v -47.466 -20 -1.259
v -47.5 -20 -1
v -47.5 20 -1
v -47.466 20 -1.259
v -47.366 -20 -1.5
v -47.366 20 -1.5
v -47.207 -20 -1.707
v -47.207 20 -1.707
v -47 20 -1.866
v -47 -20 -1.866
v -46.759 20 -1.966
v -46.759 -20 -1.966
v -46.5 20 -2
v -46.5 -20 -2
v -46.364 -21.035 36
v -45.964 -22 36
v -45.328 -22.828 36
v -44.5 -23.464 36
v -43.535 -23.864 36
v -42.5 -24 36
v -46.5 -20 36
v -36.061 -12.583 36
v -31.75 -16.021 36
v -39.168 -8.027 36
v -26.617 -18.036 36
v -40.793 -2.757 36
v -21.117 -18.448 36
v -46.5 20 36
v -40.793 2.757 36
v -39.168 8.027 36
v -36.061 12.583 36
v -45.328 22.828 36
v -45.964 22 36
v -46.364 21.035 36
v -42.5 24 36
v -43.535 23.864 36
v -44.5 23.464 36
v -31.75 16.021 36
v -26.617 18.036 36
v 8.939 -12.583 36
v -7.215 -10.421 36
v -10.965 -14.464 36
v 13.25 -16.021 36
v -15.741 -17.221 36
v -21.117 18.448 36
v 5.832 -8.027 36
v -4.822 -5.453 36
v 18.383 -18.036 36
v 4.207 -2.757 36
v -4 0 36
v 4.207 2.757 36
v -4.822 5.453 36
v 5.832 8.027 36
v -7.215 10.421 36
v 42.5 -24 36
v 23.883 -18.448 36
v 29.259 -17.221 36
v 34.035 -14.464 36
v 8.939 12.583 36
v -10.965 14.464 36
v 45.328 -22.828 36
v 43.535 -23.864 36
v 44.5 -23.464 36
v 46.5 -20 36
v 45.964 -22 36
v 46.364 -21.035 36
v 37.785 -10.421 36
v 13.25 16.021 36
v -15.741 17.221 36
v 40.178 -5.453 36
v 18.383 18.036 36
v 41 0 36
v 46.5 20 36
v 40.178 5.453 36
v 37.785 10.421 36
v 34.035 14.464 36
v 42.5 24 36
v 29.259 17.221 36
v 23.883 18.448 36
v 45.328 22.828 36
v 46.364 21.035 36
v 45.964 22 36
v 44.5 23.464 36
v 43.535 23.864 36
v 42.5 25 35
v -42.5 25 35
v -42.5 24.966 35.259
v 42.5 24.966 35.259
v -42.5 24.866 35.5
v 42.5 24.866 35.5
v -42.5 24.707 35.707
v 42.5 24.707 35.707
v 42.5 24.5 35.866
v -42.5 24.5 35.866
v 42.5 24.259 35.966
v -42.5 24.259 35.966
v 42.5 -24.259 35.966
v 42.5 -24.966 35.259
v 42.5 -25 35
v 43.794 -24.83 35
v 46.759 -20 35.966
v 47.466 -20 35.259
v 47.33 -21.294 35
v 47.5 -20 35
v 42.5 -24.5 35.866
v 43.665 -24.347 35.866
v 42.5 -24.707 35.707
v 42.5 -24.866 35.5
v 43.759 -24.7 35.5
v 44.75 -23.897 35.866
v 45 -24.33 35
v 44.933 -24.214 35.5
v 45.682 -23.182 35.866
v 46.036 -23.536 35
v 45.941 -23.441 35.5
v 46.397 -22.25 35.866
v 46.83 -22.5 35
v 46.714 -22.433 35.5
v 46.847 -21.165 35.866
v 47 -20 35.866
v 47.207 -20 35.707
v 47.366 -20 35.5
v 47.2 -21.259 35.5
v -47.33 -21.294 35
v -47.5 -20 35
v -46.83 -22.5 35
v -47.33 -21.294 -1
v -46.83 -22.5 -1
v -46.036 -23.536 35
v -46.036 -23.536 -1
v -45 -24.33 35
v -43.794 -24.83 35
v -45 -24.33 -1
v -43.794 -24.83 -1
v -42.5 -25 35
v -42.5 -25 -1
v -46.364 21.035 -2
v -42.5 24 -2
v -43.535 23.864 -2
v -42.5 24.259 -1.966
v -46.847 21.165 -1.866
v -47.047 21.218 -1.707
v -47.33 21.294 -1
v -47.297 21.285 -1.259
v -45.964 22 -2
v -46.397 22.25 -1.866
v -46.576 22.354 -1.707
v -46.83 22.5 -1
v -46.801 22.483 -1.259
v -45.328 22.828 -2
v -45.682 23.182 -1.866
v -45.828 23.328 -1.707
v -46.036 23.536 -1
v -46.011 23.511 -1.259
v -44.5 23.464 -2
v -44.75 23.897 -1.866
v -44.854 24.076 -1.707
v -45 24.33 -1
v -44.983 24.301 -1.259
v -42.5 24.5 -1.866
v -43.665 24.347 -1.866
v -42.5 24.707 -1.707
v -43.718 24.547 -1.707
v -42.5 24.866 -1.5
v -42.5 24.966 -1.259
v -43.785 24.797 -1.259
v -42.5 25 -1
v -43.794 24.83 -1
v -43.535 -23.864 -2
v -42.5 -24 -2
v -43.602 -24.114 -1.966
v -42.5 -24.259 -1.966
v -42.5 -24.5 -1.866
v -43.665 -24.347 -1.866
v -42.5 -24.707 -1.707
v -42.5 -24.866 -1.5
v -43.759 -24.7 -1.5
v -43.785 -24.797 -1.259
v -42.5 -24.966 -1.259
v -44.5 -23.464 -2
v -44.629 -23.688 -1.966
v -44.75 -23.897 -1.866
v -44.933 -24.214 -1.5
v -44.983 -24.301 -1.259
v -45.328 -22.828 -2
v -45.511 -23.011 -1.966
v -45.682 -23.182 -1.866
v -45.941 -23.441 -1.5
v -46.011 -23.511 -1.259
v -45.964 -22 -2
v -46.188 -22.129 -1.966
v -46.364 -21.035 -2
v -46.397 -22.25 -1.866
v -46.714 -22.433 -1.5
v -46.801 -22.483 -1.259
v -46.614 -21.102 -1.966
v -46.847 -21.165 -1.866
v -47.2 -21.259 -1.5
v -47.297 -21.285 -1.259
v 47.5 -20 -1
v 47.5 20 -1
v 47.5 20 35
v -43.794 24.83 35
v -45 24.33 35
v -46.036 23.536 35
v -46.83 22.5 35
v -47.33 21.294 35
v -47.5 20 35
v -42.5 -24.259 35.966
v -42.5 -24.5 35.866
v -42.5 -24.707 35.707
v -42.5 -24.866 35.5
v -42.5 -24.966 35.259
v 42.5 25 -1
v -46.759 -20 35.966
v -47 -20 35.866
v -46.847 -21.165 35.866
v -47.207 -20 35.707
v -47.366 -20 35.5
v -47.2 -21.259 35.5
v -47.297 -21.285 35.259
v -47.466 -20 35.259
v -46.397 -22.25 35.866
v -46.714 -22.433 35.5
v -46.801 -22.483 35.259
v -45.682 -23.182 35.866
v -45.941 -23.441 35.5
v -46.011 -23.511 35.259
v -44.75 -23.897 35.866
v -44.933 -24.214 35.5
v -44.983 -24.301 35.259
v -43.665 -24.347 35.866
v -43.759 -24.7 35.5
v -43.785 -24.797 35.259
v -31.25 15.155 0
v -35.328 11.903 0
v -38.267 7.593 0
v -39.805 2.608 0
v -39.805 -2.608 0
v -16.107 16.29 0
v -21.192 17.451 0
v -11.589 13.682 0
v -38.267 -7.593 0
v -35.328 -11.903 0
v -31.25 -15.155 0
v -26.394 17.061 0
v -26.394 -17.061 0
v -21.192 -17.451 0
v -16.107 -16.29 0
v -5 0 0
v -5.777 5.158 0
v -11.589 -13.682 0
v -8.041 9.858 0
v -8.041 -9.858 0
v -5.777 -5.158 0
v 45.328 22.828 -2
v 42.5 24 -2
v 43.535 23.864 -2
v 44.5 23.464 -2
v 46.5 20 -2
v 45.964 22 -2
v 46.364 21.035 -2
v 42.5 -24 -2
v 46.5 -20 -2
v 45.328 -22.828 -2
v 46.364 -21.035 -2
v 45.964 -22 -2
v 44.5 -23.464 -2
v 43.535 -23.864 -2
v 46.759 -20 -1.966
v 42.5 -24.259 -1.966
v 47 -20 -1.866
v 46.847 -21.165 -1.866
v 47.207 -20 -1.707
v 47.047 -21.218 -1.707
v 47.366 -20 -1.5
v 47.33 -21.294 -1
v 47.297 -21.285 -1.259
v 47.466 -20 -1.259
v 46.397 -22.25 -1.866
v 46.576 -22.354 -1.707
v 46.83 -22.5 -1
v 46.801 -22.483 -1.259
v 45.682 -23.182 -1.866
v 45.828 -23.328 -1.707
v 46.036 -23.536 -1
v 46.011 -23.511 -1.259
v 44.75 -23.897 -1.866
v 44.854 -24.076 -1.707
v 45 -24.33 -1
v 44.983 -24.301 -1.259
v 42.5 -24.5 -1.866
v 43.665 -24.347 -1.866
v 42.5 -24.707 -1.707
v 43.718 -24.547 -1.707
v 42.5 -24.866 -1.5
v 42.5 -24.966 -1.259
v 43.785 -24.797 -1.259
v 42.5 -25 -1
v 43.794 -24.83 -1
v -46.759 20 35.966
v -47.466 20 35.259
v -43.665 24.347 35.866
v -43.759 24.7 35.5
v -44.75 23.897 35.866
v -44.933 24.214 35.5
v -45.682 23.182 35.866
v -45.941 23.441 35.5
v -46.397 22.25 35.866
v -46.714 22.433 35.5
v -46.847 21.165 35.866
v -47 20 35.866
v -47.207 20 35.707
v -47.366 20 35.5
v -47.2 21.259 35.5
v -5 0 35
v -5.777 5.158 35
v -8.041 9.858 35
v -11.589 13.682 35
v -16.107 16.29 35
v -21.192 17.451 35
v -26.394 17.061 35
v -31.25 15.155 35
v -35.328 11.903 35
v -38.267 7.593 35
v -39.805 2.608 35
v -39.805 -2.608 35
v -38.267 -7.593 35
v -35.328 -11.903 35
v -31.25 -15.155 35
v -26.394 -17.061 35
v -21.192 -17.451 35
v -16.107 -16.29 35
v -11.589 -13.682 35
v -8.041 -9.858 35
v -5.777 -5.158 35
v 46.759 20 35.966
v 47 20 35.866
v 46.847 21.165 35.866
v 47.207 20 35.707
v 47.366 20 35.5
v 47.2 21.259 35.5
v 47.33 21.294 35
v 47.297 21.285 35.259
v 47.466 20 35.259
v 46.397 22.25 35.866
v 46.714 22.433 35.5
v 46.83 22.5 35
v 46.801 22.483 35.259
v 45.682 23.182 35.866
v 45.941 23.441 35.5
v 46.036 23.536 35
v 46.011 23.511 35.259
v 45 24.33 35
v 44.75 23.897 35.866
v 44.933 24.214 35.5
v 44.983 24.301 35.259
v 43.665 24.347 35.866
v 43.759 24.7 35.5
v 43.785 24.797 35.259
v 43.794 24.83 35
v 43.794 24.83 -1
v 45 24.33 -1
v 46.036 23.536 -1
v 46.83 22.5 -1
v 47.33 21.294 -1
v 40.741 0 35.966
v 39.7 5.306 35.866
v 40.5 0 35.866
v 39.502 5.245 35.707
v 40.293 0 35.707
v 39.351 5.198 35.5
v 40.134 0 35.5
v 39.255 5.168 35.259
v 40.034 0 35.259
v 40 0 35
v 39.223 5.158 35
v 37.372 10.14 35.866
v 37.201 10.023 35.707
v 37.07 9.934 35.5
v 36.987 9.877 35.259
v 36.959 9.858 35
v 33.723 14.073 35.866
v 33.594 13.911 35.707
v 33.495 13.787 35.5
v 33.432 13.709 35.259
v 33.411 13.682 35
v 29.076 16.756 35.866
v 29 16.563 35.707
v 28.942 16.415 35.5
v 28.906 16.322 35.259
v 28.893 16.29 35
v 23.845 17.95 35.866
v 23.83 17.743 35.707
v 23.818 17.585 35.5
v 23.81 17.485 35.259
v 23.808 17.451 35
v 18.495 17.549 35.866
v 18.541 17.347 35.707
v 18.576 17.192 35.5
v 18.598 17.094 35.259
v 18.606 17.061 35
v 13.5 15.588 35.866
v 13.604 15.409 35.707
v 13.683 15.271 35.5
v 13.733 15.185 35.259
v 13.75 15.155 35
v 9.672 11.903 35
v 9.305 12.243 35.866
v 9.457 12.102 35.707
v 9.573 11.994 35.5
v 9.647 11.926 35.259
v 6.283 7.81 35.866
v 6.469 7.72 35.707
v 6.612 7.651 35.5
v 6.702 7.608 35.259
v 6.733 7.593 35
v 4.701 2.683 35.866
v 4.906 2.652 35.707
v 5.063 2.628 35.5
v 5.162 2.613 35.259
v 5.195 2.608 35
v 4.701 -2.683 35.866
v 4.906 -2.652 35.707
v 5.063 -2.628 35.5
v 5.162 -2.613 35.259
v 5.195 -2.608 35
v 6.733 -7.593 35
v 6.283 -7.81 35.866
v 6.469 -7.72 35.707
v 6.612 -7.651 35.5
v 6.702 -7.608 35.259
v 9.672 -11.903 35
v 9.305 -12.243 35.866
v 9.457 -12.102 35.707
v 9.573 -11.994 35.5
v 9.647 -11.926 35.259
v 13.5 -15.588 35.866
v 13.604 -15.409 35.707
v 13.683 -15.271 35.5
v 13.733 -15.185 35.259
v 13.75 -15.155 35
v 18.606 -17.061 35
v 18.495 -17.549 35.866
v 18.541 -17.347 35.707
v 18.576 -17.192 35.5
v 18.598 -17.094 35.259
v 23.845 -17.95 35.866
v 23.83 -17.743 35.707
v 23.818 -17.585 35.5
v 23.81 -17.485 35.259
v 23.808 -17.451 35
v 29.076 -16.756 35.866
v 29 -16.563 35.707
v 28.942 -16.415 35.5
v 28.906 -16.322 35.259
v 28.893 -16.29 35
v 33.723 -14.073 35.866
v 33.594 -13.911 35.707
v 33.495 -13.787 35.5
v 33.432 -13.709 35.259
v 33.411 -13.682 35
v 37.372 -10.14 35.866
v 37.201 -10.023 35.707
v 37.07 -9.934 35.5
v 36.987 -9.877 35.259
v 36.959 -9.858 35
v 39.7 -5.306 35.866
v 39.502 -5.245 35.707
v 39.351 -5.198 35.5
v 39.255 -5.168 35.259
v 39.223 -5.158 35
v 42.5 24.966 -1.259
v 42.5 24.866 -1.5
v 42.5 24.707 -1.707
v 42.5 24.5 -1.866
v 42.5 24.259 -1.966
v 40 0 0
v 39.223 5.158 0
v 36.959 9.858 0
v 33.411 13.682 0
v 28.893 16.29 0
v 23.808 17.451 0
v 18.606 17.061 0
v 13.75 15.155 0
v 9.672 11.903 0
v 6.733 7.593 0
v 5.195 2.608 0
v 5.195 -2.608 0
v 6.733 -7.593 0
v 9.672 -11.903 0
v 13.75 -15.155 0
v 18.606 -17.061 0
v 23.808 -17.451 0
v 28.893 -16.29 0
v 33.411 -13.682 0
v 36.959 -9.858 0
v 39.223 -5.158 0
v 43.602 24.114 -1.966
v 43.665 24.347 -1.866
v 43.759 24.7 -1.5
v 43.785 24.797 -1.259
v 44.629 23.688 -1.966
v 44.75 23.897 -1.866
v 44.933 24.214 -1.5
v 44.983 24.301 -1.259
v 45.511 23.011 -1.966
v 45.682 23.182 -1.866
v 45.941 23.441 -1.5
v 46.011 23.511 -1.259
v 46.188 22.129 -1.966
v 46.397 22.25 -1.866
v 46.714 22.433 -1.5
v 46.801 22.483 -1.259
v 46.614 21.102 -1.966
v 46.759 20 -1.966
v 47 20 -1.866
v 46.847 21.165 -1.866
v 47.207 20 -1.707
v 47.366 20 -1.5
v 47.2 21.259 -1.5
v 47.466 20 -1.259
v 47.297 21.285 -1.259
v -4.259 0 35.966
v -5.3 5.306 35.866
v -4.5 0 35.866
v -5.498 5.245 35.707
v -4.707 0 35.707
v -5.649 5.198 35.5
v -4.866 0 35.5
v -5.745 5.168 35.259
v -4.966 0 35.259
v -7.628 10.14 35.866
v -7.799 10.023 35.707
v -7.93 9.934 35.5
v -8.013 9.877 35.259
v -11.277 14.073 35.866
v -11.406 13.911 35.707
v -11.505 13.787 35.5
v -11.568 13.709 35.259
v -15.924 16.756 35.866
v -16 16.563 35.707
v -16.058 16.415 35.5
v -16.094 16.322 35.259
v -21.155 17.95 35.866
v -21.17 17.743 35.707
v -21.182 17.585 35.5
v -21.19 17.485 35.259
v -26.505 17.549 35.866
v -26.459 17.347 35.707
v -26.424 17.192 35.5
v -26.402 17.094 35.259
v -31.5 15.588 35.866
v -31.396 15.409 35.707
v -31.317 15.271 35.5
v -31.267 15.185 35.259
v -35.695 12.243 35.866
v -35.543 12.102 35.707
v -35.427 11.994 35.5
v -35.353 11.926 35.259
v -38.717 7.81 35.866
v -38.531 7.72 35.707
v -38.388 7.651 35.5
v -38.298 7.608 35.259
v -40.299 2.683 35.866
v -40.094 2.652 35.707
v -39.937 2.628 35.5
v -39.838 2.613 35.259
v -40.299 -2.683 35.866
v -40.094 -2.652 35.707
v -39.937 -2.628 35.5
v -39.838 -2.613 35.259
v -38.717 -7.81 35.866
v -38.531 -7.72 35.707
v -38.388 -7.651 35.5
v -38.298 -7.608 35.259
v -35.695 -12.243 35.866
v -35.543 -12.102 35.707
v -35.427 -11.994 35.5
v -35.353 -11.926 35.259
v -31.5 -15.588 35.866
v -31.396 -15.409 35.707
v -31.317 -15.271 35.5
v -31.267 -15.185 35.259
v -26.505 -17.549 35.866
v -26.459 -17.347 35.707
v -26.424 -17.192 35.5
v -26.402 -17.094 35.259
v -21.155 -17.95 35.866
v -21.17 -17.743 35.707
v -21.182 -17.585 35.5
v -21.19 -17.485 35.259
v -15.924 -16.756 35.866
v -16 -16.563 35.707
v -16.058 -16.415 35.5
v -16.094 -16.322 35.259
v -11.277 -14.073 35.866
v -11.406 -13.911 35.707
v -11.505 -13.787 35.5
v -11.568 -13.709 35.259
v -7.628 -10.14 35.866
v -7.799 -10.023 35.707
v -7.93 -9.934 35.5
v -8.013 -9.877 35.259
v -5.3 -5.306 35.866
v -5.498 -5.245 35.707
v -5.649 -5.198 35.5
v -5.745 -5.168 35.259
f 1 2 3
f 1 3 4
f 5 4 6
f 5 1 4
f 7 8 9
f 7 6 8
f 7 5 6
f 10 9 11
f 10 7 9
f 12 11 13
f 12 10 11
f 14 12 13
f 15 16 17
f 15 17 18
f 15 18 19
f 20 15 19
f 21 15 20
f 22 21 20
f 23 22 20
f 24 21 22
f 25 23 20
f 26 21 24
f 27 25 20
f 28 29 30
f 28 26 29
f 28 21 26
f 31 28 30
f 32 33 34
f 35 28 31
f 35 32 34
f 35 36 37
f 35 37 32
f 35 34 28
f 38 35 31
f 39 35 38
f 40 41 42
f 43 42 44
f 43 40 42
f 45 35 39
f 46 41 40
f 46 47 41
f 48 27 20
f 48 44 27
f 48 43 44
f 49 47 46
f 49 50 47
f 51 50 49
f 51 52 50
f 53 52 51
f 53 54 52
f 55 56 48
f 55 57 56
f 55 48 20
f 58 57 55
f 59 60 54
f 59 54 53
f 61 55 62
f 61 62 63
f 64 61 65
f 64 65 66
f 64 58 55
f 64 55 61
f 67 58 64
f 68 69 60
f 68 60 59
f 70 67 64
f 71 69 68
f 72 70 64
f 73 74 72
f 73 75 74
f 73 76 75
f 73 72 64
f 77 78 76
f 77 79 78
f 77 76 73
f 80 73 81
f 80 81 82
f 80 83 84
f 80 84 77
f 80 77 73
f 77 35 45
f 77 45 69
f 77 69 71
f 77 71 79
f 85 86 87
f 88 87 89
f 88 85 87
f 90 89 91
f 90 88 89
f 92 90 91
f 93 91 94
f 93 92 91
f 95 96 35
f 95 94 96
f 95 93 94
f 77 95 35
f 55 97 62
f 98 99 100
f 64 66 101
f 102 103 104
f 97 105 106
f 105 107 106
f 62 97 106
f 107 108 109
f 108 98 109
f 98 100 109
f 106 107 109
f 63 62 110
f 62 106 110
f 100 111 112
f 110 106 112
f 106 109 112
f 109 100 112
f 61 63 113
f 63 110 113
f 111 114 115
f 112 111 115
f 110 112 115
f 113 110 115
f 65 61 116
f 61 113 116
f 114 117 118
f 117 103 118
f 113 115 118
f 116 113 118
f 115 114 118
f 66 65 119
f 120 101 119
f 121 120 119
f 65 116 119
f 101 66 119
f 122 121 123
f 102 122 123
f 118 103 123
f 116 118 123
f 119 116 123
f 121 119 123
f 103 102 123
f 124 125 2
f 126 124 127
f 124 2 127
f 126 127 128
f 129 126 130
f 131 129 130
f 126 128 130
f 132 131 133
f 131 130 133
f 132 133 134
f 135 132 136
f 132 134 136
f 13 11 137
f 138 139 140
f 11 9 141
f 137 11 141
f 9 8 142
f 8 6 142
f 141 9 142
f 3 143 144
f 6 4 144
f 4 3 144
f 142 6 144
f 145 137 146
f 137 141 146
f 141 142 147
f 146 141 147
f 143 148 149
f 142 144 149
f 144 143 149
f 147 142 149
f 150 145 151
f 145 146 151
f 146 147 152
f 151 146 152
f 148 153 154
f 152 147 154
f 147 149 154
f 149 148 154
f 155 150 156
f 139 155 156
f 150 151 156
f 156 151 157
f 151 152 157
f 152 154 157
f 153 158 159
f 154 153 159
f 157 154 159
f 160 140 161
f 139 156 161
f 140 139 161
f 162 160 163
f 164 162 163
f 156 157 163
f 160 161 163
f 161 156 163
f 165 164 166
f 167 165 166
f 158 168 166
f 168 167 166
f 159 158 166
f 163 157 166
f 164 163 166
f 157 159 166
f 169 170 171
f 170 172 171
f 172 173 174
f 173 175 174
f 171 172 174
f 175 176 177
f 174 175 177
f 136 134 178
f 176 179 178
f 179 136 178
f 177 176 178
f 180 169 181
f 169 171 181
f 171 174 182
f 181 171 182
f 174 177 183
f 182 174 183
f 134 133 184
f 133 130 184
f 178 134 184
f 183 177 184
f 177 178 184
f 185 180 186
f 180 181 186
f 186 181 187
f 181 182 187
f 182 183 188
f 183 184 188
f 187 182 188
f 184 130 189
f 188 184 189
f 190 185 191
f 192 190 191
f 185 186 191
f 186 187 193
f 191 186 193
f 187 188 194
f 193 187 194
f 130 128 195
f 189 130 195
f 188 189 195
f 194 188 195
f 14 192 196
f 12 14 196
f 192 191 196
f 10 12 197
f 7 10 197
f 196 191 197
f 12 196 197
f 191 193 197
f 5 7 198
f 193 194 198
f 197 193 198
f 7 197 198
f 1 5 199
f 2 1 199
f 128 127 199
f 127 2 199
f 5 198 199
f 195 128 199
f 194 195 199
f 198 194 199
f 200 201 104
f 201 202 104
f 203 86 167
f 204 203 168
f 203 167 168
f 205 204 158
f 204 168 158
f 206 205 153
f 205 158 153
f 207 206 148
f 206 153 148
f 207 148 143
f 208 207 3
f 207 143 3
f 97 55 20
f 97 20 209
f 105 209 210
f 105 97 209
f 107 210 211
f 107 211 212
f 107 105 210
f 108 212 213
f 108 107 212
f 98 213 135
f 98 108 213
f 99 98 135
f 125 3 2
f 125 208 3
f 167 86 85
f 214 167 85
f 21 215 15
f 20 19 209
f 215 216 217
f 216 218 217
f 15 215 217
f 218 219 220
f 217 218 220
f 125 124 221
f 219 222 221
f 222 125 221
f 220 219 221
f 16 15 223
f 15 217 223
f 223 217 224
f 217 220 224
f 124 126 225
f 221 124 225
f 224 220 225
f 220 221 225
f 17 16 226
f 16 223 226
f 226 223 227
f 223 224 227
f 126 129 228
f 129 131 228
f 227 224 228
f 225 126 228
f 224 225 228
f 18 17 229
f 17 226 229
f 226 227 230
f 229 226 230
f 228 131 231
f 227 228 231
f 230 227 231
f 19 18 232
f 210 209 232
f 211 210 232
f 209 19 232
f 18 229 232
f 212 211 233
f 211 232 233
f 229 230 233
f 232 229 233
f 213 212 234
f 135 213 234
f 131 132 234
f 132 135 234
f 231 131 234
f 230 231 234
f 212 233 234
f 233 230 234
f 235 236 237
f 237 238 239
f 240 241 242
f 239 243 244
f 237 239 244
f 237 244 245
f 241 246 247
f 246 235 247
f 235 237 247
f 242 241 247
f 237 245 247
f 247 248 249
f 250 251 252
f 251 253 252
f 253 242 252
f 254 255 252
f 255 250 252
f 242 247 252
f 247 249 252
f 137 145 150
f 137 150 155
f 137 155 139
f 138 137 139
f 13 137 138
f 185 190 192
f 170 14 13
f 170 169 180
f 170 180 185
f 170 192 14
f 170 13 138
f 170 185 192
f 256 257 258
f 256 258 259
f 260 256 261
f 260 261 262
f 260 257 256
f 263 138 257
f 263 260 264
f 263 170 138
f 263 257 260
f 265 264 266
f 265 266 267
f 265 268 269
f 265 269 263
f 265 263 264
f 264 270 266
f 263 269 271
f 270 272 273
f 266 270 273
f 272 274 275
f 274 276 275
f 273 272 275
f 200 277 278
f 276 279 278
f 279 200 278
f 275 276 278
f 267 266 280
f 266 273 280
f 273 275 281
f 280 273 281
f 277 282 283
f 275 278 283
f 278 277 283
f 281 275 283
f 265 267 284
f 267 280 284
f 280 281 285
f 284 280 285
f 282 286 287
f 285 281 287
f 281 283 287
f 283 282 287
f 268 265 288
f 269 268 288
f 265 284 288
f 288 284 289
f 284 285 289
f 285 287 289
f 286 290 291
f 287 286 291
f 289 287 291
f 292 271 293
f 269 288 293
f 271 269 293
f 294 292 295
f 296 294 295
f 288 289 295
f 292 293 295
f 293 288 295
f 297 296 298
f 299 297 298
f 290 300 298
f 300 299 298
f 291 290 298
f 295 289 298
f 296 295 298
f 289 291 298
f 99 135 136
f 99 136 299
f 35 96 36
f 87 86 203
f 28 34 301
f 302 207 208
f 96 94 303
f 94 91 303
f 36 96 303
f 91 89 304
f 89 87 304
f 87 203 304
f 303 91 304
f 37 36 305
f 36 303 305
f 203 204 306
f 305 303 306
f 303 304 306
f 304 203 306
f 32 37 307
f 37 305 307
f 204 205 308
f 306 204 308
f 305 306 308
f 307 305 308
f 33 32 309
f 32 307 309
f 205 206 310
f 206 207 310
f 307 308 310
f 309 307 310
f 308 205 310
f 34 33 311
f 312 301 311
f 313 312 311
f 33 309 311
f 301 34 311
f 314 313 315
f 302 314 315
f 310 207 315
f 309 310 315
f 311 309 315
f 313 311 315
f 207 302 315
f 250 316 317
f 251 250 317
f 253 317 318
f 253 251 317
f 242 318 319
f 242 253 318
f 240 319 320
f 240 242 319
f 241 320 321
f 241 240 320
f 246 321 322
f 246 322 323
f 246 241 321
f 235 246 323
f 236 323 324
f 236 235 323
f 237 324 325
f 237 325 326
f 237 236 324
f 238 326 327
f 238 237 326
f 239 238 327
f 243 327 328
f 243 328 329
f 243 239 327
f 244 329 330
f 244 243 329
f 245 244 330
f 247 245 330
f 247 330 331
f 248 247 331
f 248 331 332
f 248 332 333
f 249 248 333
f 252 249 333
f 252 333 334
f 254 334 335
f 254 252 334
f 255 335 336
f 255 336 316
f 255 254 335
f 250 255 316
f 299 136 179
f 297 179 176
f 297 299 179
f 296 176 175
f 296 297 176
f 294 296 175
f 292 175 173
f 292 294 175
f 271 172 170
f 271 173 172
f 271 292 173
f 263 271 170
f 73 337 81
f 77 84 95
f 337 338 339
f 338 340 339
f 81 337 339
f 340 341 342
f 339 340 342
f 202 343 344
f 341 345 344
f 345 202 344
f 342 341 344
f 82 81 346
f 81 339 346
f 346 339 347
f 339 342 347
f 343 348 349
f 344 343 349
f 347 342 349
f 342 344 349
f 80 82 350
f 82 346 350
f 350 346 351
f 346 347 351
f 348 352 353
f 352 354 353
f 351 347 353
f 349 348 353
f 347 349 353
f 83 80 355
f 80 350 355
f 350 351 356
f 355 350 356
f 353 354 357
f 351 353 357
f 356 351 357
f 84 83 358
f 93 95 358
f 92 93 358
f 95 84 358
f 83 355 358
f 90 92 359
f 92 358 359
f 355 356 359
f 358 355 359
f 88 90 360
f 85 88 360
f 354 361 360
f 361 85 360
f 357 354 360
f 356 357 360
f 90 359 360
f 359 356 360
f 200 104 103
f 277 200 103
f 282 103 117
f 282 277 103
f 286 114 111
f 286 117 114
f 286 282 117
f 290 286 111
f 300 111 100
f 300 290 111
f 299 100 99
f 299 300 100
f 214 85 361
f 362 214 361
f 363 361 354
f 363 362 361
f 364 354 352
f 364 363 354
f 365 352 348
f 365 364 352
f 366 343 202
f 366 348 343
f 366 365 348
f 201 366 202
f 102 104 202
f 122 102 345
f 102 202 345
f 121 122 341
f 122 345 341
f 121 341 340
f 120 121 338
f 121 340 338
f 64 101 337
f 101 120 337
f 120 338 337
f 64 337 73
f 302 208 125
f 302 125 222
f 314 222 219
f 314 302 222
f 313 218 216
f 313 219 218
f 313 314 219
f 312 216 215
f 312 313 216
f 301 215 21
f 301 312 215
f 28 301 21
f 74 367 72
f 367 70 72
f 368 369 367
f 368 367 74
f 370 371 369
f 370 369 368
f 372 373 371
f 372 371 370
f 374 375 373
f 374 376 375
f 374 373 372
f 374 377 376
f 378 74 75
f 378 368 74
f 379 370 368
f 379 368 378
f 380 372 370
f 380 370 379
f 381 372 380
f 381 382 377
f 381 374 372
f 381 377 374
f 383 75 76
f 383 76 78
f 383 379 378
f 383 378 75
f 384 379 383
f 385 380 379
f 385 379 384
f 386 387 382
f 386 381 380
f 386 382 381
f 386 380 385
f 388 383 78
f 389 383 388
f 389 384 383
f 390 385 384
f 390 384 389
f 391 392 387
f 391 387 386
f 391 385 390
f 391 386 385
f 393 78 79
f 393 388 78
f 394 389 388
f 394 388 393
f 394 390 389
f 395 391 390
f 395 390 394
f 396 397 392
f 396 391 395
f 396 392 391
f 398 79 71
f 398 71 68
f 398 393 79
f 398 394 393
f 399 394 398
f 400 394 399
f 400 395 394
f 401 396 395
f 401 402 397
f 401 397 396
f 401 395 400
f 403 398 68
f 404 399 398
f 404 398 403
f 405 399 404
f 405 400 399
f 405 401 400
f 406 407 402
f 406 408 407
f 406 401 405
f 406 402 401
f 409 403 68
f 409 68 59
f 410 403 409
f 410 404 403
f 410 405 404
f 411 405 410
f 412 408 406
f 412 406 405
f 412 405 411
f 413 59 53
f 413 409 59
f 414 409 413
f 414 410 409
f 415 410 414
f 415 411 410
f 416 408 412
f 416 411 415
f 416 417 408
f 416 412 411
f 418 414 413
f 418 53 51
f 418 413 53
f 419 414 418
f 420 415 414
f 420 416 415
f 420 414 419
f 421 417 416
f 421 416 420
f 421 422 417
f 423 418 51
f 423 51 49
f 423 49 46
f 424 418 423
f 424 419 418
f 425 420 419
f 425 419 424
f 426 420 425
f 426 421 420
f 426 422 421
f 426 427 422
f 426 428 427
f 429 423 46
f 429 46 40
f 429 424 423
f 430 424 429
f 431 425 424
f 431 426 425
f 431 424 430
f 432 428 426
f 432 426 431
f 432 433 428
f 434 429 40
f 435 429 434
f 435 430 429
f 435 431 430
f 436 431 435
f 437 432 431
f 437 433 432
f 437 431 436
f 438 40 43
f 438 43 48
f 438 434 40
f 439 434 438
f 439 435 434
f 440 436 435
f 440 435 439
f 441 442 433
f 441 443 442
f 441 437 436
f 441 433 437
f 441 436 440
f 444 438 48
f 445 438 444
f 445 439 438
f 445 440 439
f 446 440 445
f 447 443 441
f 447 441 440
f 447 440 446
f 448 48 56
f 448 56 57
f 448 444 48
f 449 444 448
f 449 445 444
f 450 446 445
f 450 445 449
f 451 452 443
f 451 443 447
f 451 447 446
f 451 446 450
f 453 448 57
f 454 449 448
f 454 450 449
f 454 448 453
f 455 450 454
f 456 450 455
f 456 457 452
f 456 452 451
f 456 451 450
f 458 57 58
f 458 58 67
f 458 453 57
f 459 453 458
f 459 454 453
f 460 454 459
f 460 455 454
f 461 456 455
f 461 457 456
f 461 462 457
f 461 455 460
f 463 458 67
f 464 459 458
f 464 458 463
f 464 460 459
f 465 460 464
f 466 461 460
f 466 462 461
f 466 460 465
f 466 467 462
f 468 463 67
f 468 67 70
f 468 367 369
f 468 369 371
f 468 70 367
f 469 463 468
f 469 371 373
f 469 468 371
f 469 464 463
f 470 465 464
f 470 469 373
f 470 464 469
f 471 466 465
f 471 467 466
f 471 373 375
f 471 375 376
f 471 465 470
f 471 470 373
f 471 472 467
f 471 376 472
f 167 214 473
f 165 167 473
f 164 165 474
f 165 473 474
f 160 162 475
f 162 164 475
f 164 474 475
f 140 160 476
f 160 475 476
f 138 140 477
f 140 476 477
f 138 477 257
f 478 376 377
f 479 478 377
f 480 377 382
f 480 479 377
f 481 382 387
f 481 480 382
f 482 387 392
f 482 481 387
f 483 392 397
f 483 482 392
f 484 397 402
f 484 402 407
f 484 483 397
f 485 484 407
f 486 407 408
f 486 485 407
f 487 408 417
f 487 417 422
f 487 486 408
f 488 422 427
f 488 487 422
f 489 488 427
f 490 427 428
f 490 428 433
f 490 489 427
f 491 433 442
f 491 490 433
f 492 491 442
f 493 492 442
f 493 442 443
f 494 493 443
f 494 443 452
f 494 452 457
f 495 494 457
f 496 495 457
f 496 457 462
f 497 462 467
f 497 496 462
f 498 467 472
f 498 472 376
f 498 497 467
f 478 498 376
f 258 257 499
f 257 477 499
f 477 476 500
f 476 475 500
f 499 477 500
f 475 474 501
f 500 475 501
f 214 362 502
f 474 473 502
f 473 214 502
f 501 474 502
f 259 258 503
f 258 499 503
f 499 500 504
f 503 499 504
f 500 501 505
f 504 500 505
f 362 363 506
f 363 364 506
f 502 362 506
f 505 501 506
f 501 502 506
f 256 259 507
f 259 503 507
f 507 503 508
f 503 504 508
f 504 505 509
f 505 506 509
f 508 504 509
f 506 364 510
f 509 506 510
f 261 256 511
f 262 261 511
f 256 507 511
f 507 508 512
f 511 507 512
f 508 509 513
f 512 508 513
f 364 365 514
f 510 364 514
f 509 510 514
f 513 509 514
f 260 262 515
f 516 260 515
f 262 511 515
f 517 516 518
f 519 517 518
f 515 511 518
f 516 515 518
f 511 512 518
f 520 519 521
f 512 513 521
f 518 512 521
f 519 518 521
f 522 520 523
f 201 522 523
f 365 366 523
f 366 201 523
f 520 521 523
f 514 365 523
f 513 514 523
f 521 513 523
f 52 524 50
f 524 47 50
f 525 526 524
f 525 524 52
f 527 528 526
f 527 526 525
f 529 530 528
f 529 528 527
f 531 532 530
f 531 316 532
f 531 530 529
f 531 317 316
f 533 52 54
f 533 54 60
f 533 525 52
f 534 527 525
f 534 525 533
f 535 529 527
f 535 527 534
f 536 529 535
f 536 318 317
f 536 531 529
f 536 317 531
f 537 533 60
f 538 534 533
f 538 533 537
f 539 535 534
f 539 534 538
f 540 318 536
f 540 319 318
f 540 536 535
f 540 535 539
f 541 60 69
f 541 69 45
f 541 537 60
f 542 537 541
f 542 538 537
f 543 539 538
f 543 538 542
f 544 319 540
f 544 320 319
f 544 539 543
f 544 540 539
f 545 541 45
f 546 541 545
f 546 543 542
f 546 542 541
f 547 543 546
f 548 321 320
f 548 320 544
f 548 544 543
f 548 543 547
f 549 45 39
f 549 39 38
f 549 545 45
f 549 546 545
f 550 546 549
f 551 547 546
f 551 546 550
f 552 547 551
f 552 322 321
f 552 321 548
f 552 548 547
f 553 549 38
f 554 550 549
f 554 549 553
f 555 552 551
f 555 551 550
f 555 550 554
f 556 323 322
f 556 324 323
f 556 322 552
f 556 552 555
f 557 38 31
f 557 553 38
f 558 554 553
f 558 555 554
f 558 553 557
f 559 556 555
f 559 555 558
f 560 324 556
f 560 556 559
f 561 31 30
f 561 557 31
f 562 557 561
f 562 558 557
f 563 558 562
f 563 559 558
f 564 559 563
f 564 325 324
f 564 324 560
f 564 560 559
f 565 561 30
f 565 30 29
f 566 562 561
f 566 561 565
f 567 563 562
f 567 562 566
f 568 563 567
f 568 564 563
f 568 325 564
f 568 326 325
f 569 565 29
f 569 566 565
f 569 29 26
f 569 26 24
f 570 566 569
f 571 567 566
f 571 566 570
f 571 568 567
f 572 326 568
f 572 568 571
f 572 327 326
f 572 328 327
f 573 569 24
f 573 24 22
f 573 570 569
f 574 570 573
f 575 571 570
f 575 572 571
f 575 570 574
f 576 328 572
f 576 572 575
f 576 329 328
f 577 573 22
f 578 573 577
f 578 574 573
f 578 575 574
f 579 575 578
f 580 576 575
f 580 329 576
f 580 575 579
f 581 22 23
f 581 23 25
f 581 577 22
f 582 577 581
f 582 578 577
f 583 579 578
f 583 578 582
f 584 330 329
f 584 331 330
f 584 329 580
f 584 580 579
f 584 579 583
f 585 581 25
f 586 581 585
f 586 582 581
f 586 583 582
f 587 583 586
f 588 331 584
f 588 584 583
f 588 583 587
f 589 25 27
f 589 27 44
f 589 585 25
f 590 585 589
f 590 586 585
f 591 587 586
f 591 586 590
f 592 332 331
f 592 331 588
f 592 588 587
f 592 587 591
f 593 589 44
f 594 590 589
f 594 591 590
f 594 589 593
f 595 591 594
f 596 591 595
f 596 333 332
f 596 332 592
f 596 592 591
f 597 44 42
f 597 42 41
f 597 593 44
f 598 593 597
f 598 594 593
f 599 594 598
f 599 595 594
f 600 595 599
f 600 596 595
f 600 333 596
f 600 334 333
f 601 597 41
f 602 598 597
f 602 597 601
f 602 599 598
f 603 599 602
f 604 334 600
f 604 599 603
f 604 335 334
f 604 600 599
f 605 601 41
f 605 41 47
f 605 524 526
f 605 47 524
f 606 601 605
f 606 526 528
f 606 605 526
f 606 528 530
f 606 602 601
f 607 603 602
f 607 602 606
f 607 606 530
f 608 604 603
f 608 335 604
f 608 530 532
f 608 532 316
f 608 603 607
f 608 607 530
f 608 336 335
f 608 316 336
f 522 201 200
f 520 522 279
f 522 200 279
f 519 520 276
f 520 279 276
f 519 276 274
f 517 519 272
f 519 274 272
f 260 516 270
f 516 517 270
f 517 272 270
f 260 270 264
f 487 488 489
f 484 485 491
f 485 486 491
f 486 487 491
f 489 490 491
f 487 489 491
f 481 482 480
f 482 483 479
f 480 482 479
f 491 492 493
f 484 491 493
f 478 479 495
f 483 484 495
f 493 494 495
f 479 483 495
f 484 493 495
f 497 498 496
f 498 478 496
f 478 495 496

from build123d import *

# Parameters (mm, degrees)
F0_W         = 95
F0_H         = 50
F0_R         = 17.5
F1_DEPTH     = 36
F2_W         = 95
F2_H         = 50
F3_DEPTH     = 2
F4_R         = 1
F5_T1_DEPTH  = 38
F5_T4_ANGLE  = 90
F5_T6_ANGLE  = 90
F5_T8_ANGLE  = 90
F5_T10_ANGLE = 90
F5_T12_ANGLE = 90
F5_T14_ANGLE = 90
F5_T16_ANGLE = 90
F5_T18_ANGLE = 90


# Not quite as in the source:
# - a fillet or chamfer that OpenCascade refuses, or shapes differently, is made with other operations: its cross-section is extruded or revolved along the edge and cut away or added


with BuildPart() as f1:
    # F0 (on Top) → F1 (new body)
    with BuildSketch(Plane.XY):
        Rectangle(F0_W, F0_H)
        with Locations((-22.5, 0)):
            Circle(F0_R, mode=Mode.SUBTRACT)
        with Locations((22.5, 0)):
            Circle(F0_R, mode=Mode.SUBTRACT)
    extrude(amount=F1_DEPTH)

    # F2 (on face) → F3 (join)
    with BuildSketch(Plane(origin=(0, 0, 0), x_dir=(1, 0, 0), z_dir=(0, 0, -1))):
        Rectangle(F2_W, F2_H)
    extrude(amount=F3_DEPTH)

    # F4
    f4_edges = [f1.edges().sort_by_distance(p)[0] for p in [
        (0, 25, 36),
        (-47.5, 0, 36),
        (0, -25, 36),
        (47.5, 0, 36),
        (-40, 0, 36),
        (5, 0, 36),
        (0, 25, -2),
        (47.5, 0, -2),
        (0, -25, -2),
        (-47.5, 0, -2),
    ]]
    fillet(f4_edges, radius=F4_R)

    # F5: fillet of radius 5 on 4 edges, made by hand

    # F5_s2 → F5_t1 (cut)
    with BuildSketch(Plane.XY.offset(-2)):
        with BuildLine():
            ThreePointArc((42.5, 25), (46.0355339059, 23.5355339059), (47.5, 20))
            Line((47.5, 20), (47.5, 25))
            Line((47.5, 25), (42.5, 25))
        make_face()
        with BuildLine():
            ThreePointArc((47.5, -20), (46.0355339059, -23.5355339059), (42.5, -25))
            Line((42.5, -25), (47.5, -25))
            Line((47.5, -25), (47.5, -20))
        make_face()
        with BuildLine():
            ThreePointArc((-47.5, -20), (-46.0355339059, -23.5355339059), (-42.5, -25))
            Line((-42.5, -25), (-47.5, -25))
            Line((-47.5, -25), (-47.5, -20))
        make_face()
        with BuildLine():
            ThreePointArc((-42.5, 25), (-46.0355339059, 23.5355339059), (-47.5, 20))
            Line((-47.5, 20), (-47.5, 25))
            Line((-47.5, 25), (-42.5, 25))
        make_face()
    extrude(amount=F5_T1_DEPTH, mode=Mode.SUBTRACT)

    # F5_s3 → F5_t4 (revolve, cut)
    with BuildSketch(Plane.XZ.offset(-20)):
        with BuildLine():
            ThreePointArc((-46.5, -2), (-47.2071067812, -1.7071067812), (-47.5, -1))
            Line((-47.5, -1), (-47.5, -2))
            Line((-47.5, -2), (-46.5, -2))
        make_face()
    revolve(axis=Axis((-42.5, 20, -2), (0, 0, -1)), revolution_arc=F5_T4_ANGLE, mode=Mode.SUBTRACT)

    # F5_s5 → F5_t6 (revolve, cut)
    with BuildSketch(Plane.YZ.offset(-42.5)):
        with BuildLine():
            ThreePointArc((24, 36), (24.7071067812, 35.7071067812), (25, 35))
            Line((25, 35), (25, 36))
            Line((25, 36), (24, 36))
        make_face()
    revolve(axis=Axis((-42.5, 20, 36), (0, 0, 1)), revolution_arc=F5_T6_ANGLE, mode=Mode.SUBTRACT)

    # F5_s7 → F5_t8 (revolve, cut)
    with BuildSketch(Plane.YZ.offset(-42.5)):
        with BuildLine():
            ThreePointArc((-24, -2), (-24.7071067812, -1.7071067812), (-25, -1))
            Line((-25, -1), (-25, -2))
            Line((-25, -2), (-24, -2))
        make_face()
    revolve(axis=Axis((-42.5, -20, -2), (0, 0, -1)), revolution_arc=F5_T8_ANGLE, mode=Mode.SUBTRACT)

    # F5_s9 → F5_t10 (revolve, cut)
    with BuildSketch(Plane.XZ.offset(20)):
        with BuildLine():
            ThreePointArc((-46.5, 36), (-47.2071067812, 35.7071067812), (-47.5, 35))
            Line((-47.5, 35), (-47.5, 36))
            Line((-47.5, 36), (-46.5, 36))
        make_face()
    revolve(axis=Axis((-42.5, -20, 36), (0, 0, 1)), revolution_arc=F5_T10_ANGLE, mode=Mode.SUBTRACT)

    # F5_s11 → F5_t12 (revolve, cut)
    with BuildSketch(Plane.YZ.offset(42.5)):
        with BuildLine():
            ThreePointArc((-24, 36), (-24.7071067812, 35.7071067812), (-25, 35))
            Line((-25, 35), (-25, 36))
            Line((-25, 36), (-24, 36))
        make_face()
    revolve(axis=Axis((42.5, -20, 36), (0, 0, 1)), revolution_arc=F5_T12_ANGLE, mode=Mode.SUBTRACT)

    # F5_s13 → F5_t14 (revolve, cut)
    with BuildSketch(Plane.XZ.offset(20)):
        with BuildLine():
            ThreePointArc((46.5, -2), (47.2071067812, -1.7071067812), (47.5, -1))
            Line((47.5, -1), (47.5, -2))
            Line((47.5, -2), (46.5, -2))
        make_face()
    revolve(axis=Axis((42.5, -20, -2), (0, 0, -1)), revolution_arc=F5_T14_ANGLE, mode=Mode.SUBTRACT)

    # F5_s15 → F5_t16 (revolve, cut)
    with BuildSketch(Plane.XZ.offset(-20)):
        with BuildLine():
            ThreePointArc((46.5, 36), (47.2071067812, 35.7071067812), (47.5, 35))
            Line((47.5, 35), (47.5, 36))
            Line((47.5, 36), (46.5, 36))
        make_face()
    revolve(axis=Axis((42.5, 20, 36), (0, 0, 1)), revolution_arc=F5_T16_ANGLE, mode=Mode.SUBTRACT)

    # F5_s17 → F5_t18 (revolve, cut)
    with BuildSketch(Plane.YZ.offset(42.5)):
        with BuildLine():
            ThreePointArc((24, -2), (24.7071067812, -1.7071067812), (25, -1))
            Line((25, -1), (25, -2))
            Line((25, -2), (24, -2))
        make_face()
    revolve(axis=Axis((42.5, 20, -2), (0, 0, -1)), revolution_arc=F5_T18_ANGLE, mode=Mode.SUBTRACT)


solid = f1.part
